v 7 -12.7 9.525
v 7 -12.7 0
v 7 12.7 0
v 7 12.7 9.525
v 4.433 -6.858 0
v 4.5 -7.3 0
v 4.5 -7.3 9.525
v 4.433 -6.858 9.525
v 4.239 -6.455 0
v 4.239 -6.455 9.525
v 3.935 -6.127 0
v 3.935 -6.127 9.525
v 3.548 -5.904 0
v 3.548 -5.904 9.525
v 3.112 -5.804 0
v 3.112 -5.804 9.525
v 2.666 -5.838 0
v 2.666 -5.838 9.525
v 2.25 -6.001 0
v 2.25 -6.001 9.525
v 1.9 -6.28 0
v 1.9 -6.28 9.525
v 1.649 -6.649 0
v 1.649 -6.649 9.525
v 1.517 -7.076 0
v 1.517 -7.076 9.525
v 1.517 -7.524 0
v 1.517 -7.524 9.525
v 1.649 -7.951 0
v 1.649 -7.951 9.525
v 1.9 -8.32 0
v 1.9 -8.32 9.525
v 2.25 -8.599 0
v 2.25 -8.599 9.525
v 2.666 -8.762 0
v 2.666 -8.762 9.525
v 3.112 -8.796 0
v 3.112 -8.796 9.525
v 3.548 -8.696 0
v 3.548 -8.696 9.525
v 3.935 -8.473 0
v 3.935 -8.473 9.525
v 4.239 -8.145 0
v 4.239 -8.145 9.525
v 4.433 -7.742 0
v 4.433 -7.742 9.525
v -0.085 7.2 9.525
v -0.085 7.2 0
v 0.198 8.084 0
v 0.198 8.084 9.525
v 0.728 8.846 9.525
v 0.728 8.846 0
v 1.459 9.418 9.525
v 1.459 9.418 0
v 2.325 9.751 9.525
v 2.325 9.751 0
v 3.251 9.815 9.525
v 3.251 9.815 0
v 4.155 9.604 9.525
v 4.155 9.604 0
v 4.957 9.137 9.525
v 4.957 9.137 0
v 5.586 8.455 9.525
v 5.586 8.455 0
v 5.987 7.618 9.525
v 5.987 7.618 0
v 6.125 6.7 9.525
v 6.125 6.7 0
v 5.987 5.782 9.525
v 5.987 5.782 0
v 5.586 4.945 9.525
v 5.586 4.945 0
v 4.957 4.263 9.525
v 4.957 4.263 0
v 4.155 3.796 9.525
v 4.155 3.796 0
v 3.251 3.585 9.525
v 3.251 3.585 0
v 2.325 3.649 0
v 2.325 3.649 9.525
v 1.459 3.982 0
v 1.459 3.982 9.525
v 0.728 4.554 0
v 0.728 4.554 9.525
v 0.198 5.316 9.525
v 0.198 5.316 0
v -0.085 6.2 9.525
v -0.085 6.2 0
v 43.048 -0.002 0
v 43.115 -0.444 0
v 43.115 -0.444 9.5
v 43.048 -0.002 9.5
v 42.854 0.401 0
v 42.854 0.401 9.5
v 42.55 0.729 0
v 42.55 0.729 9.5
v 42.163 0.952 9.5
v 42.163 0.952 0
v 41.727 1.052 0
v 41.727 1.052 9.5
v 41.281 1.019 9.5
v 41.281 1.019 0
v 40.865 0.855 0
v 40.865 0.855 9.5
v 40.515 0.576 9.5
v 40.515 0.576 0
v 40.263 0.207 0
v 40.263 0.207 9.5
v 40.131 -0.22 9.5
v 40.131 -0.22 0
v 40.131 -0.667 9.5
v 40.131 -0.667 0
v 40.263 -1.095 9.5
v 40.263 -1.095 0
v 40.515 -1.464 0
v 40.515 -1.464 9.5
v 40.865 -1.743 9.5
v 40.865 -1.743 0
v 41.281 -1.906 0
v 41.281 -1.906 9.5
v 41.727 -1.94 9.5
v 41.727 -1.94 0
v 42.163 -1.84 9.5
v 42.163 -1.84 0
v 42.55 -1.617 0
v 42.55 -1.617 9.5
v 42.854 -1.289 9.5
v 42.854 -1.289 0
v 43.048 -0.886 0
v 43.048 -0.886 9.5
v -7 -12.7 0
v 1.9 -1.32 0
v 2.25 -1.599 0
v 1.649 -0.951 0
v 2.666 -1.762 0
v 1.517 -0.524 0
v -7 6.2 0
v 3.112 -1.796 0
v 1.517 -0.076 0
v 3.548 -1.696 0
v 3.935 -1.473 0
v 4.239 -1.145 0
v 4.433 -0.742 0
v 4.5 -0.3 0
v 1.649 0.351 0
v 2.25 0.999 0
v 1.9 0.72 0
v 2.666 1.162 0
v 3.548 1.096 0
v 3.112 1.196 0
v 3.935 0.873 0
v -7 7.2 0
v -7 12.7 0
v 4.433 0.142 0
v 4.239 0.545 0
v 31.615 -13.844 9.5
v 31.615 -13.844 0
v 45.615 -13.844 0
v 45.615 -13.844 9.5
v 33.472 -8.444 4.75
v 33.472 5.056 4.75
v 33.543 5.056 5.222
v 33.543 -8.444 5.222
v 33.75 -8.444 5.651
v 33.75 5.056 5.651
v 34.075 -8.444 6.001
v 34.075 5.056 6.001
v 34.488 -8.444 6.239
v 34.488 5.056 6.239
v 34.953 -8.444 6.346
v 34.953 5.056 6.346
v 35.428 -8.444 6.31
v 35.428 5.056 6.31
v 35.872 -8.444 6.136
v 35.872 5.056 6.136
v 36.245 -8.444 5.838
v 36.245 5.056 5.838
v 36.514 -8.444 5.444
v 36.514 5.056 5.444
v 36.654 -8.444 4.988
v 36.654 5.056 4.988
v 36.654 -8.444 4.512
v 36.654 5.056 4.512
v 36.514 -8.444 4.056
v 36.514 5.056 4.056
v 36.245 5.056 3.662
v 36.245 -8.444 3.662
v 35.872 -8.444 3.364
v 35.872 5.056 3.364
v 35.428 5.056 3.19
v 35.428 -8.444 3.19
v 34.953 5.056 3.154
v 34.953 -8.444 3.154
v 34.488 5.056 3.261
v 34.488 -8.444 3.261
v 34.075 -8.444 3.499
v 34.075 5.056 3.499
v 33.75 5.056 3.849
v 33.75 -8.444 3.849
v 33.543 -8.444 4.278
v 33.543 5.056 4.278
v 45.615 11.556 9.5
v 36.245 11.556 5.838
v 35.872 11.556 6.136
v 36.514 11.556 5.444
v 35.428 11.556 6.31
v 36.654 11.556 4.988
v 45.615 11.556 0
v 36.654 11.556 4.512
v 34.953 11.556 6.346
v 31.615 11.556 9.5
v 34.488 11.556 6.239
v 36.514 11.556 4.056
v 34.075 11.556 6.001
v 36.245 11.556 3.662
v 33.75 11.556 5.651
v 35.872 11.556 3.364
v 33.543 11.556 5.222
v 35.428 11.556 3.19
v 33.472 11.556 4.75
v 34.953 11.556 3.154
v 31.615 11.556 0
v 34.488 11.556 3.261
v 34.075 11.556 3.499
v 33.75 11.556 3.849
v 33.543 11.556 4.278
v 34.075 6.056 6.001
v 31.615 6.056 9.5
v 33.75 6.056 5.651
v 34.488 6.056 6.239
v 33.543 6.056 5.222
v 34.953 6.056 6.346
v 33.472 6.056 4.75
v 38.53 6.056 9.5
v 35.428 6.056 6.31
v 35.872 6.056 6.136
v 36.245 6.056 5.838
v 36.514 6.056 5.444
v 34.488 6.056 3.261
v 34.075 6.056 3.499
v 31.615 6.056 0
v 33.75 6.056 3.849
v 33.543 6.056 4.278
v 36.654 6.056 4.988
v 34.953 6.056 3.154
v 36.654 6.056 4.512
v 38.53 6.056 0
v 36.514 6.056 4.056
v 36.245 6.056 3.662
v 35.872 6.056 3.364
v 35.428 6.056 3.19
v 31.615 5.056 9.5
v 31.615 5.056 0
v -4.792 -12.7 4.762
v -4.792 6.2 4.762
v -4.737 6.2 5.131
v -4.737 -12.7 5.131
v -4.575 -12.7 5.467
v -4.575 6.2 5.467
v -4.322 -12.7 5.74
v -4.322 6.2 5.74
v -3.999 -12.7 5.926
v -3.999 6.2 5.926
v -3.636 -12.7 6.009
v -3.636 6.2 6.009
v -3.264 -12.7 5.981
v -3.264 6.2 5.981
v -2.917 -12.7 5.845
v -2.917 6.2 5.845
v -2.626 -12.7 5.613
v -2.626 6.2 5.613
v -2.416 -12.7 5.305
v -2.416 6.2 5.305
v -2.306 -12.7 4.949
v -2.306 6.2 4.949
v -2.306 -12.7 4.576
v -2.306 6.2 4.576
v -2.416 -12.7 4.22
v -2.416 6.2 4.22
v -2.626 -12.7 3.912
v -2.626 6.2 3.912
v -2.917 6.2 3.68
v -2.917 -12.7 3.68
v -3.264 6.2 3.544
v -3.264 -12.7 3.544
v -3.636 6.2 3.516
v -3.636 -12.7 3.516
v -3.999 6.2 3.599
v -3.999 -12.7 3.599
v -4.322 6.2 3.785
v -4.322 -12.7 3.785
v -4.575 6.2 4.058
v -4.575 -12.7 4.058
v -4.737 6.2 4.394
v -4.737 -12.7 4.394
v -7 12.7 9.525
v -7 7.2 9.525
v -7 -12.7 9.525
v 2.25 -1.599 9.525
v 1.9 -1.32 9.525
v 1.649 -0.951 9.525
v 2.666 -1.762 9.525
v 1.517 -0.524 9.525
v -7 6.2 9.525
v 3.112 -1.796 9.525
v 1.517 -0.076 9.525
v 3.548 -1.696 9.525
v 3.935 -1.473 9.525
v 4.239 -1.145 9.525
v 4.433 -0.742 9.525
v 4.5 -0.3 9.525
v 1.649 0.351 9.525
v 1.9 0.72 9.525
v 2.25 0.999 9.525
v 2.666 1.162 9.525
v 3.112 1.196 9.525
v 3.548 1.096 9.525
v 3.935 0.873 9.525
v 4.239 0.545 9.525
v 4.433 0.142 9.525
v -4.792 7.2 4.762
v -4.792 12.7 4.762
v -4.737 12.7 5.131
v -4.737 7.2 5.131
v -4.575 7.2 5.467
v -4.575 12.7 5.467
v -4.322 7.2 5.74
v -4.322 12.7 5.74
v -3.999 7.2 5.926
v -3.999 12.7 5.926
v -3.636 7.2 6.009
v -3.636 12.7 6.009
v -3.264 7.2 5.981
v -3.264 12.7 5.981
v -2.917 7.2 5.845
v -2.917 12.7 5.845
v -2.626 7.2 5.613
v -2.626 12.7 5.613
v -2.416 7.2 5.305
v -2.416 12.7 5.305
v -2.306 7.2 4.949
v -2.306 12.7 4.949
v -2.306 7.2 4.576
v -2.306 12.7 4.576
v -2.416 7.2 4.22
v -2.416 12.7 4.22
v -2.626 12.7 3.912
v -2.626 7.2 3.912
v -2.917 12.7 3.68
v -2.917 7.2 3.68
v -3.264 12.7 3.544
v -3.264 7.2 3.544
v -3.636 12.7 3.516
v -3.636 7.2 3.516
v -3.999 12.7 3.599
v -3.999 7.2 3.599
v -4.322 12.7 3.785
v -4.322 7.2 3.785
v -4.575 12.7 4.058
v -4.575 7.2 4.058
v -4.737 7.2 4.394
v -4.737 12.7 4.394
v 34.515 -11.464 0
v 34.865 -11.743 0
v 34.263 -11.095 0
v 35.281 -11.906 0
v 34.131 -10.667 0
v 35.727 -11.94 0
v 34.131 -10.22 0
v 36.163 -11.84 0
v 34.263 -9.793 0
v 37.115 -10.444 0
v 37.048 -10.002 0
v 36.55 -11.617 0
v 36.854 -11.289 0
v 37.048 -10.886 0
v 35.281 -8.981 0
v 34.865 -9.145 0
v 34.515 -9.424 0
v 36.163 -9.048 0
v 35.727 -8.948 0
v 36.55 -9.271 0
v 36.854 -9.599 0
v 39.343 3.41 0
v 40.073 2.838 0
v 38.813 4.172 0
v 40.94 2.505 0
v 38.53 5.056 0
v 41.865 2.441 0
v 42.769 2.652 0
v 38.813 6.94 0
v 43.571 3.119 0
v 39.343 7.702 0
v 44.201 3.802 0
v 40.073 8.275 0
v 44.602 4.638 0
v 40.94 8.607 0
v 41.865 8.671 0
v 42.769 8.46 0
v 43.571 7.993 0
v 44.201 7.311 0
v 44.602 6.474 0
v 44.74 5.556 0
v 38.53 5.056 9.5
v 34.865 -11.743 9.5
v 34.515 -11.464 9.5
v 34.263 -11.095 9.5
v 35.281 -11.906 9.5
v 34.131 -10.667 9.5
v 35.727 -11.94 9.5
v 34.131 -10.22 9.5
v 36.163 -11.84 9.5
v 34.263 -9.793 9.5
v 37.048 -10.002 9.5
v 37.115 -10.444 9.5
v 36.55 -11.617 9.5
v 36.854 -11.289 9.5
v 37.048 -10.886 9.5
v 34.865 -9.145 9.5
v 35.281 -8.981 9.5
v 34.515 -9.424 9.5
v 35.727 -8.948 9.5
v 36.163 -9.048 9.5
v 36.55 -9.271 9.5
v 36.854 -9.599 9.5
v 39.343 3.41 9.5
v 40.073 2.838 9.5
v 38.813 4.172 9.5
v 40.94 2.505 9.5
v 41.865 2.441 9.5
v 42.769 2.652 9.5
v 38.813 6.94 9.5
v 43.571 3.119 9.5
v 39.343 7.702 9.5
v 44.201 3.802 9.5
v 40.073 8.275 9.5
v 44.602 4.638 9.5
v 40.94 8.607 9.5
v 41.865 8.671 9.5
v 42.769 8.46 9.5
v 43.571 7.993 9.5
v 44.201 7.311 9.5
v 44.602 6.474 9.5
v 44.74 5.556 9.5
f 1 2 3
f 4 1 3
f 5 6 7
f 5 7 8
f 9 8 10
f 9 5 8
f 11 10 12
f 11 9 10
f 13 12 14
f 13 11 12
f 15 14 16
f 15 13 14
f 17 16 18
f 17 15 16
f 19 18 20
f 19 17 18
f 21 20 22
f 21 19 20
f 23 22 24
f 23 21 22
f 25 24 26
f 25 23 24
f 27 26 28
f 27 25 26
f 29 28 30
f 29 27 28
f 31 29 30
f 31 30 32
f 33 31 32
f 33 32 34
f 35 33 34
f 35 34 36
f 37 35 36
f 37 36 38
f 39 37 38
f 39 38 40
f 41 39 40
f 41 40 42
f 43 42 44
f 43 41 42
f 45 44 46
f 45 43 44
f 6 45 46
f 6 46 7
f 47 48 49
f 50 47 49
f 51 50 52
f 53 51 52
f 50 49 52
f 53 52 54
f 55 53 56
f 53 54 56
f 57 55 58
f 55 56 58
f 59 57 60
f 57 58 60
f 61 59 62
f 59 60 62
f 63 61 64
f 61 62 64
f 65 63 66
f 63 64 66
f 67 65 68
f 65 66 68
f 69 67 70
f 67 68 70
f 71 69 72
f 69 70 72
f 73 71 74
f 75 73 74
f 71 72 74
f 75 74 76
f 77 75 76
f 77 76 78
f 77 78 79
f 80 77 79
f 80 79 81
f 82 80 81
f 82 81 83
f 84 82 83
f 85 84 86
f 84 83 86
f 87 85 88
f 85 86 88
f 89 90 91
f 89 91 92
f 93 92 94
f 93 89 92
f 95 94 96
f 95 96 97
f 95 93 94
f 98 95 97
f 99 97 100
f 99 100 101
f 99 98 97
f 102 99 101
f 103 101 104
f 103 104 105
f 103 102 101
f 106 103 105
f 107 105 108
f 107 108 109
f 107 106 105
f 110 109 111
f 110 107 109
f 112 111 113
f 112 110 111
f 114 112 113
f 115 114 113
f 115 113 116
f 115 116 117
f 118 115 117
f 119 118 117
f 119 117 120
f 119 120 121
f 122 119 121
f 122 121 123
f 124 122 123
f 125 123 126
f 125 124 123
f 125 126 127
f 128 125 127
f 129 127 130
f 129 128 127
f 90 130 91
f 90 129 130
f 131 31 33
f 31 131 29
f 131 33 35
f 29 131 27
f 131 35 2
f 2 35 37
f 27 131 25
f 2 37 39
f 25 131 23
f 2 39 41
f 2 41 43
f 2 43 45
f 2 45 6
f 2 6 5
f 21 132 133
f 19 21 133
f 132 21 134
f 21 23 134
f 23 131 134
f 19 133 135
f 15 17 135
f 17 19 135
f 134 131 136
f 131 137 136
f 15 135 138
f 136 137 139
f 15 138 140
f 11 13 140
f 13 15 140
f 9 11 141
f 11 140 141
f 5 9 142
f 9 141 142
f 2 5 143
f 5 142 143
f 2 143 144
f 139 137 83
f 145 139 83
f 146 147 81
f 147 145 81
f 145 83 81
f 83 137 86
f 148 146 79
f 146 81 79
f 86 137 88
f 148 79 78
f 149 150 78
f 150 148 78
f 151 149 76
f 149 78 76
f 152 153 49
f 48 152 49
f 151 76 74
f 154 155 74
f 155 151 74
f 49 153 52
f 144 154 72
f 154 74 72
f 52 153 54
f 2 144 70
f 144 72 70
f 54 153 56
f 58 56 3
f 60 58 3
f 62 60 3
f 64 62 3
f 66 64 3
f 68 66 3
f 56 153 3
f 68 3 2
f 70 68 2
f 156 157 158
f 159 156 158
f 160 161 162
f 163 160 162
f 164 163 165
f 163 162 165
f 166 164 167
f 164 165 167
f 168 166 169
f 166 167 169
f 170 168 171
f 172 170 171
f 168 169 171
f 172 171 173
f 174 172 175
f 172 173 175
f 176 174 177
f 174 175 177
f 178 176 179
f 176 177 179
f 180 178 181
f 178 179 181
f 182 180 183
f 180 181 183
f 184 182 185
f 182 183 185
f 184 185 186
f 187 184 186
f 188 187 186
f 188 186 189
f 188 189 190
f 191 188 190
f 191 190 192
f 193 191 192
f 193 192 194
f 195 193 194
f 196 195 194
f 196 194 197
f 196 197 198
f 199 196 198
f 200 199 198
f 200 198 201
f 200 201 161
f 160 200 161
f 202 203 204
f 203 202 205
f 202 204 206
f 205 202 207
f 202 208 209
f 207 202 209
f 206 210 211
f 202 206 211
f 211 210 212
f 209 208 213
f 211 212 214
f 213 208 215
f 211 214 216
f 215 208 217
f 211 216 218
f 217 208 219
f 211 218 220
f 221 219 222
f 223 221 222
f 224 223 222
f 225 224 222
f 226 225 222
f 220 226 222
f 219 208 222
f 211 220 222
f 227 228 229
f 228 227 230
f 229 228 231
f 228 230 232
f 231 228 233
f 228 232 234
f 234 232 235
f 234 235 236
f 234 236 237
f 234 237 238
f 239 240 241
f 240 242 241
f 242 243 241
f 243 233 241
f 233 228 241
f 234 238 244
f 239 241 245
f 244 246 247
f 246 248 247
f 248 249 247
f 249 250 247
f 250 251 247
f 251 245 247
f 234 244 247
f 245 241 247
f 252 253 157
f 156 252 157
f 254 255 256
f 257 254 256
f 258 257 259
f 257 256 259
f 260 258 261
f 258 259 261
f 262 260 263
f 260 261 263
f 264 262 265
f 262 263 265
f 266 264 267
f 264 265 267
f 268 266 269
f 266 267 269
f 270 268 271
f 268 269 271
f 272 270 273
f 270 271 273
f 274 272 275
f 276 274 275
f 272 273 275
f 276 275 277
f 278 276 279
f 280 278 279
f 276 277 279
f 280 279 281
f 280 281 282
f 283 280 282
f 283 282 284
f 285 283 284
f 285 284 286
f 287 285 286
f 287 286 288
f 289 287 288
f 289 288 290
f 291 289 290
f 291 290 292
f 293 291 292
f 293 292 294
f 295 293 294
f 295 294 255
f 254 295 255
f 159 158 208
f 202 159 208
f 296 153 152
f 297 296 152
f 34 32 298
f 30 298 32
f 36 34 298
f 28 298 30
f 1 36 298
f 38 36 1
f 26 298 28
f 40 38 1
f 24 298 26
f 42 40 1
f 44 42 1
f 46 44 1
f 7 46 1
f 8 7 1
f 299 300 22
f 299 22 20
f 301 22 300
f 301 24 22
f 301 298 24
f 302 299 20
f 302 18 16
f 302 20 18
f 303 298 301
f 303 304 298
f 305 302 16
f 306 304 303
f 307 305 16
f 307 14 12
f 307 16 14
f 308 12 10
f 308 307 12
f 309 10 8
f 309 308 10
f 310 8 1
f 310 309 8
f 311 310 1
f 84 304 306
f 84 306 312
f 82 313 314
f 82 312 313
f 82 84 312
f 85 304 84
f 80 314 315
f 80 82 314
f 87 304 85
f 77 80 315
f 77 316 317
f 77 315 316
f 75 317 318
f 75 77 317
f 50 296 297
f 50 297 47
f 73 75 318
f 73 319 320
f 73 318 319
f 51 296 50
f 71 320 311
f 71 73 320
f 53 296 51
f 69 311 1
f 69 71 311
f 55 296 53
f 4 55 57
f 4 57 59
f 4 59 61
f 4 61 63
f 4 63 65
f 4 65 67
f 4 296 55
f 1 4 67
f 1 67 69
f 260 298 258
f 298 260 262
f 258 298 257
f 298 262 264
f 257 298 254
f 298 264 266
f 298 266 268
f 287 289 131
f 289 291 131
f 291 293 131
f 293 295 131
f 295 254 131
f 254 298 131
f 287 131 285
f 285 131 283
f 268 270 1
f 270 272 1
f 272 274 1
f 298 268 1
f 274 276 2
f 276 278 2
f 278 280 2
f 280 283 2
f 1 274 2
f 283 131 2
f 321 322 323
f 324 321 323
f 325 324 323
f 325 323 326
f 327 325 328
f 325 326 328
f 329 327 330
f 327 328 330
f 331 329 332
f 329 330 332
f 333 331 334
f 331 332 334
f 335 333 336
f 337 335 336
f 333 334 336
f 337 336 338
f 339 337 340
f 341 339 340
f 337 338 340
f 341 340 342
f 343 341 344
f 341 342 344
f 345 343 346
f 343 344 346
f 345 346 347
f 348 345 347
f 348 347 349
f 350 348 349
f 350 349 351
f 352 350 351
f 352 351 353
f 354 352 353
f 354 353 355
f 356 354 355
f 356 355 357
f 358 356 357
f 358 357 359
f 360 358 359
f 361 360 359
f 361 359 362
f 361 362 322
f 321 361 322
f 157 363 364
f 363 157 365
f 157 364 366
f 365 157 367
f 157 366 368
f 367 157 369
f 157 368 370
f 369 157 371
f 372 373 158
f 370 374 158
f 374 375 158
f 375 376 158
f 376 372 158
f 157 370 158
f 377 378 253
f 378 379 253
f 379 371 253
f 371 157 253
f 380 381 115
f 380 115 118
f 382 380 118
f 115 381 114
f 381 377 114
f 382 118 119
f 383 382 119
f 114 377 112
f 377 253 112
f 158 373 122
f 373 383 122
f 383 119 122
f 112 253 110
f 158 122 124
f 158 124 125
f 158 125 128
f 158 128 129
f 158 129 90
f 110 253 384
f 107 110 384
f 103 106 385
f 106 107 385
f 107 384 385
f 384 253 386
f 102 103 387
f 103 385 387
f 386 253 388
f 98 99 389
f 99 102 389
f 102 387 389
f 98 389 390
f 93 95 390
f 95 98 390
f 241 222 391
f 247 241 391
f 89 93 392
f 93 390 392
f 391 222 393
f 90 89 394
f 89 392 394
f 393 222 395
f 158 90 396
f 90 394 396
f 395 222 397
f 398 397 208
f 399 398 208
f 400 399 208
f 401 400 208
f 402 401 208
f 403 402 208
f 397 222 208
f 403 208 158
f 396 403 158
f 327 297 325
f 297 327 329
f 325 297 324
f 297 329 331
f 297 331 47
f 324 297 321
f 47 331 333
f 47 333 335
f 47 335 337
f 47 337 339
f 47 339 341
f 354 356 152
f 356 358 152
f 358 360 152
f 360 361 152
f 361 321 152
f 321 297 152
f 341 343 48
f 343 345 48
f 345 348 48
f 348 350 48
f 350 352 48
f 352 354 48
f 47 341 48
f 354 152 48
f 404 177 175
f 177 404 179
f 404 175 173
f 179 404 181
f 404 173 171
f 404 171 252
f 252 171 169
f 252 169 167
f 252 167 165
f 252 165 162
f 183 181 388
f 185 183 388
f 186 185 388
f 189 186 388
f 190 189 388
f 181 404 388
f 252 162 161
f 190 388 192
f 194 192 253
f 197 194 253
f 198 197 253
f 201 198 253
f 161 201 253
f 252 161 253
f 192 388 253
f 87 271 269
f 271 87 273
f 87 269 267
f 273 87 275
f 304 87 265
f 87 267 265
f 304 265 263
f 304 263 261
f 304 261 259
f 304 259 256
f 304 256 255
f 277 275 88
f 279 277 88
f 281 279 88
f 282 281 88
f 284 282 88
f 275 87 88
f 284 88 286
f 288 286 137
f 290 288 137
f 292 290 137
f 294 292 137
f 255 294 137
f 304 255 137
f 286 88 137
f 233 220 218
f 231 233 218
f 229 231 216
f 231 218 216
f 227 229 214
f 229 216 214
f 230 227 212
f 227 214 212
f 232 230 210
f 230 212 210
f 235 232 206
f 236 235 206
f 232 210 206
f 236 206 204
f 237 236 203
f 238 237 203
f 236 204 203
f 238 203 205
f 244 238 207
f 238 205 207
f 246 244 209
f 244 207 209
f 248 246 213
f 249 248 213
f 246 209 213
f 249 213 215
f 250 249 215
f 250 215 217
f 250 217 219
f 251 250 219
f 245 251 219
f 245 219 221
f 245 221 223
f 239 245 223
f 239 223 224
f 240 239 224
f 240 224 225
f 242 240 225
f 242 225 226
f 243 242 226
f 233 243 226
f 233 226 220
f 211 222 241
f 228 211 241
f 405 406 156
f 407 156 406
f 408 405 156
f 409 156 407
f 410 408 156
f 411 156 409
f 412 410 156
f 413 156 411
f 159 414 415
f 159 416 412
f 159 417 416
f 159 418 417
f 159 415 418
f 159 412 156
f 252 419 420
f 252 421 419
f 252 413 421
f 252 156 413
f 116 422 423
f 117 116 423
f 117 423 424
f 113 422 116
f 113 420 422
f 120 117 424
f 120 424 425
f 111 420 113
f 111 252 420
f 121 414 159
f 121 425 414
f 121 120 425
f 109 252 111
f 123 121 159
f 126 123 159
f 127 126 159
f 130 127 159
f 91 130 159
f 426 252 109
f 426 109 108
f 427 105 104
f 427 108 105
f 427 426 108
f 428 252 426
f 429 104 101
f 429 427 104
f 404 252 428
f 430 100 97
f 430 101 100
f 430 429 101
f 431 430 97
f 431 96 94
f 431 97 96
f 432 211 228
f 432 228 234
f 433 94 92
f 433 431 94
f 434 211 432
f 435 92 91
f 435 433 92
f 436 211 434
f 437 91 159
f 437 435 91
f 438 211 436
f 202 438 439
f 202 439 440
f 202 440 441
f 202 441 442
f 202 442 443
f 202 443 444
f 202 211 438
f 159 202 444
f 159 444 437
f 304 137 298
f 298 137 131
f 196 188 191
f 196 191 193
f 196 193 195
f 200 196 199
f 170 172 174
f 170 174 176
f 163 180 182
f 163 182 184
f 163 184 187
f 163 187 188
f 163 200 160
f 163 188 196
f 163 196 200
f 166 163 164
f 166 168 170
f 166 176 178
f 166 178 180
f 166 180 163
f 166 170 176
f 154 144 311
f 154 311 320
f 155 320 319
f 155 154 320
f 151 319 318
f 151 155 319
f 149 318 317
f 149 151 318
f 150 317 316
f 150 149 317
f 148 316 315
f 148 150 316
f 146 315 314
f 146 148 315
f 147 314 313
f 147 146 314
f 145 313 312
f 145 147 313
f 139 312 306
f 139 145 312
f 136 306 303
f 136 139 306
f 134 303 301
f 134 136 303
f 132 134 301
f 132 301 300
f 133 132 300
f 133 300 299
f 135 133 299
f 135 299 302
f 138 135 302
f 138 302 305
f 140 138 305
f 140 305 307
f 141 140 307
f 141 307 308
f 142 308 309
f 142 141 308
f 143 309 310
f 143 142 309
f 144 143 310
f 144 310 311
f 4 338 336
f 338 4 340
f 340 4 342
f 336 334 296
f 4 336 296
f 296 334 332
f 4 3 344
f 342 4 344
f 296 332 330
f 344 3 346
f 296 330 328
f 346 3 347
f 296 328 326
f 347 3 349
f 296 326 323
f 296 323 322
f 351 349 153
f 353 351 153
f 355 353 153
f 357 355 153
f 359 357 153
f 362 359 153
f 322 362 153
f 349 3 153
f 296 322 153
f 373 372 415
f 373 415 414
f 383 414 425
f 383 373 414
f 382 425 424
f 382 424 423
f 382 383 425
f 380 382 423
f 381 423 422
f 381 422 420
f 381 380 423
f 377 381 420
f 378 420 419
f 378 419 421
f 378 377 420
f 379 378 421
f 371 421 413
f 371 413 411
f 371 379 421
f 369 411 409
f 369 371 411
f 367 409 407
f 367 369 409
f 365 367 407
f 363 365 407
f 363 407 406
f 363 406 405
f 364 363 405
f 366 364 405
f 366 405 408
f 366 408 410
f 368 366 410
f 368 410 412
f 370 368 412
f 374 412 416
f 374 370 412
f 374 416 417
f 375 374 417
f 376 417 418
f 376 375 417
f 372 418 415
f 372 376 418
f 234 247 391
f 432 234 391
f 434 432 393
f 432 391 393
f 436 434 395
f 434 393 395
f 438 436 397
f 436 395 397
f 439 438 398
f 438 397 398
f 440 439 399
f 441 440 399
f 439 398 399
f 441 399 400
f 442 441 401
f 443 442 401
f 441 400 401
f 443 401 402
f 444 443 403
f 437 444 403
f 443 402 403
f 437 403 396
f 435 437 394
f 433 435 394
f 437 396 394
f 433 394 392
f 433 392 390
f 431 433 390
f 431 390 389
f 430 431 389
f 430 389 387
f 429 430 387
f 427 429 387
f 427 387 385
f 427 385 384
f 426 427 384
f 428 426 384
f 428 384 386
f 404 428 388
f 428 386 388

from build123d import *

# Parameters (mm, degrees)
F0_R     = 1.5
F1_DEPTH = 9.525
F2_R     = 1.25
F3_DEPTH = 25.401
F4_R     = 1.5
F5_DEPTH = 9.5
F6_R     = 1.6
F7_DEPTH = 20


# Not quite as in the source:
# - a length typed as a fraction of an inch, garbled in the dataset ("3 / 203.2 mm" for 3/8 in), is restored


with BuildPart() as f1:
    # F0 (on Top) → F1 (new body)
    with BuildSketch(Plane.XY):
        with BuildLine():
            Line((-7, -12.7), (7, -12.7))
            Line((7, -12.7), (7, 12.7))
            Line((7, 12.7), (-7, 12.7))
            Line((-7, 12.7), (-7, 7.2))
            Line((-7, 7.2), (-0.0847406698, 7.2))
            ThreePointArc((-0.0847406698, 7.2), (6.125, 6.7), (-0.0847406698, 6.2))
            Line((-0.0847406698, 6.2), (-7, 6.2))
            Line((-7, 6.2), (-7, -12.7))
        make_face()
        with Locations((3, -7.3)):
            Circle(F0_R, mode=Mode.SUBTRACT)
        with Locations((3, -0.3)):
            Circle(F0_R, mode=Mode.SUBTRACT)
    extrude(amount=F1_DEPTH)

    # F2 (on face) → F3 (cut, through all)
    with BuildSketch(Plane(origin=(0, 12.7, 0), x_dir=(-1, 0, 0), z_dir=(0, 1, 0))):
        with Locations((3.5423703349, 4.7625)):
            Circle(F2_R)
    extrude(amount=-F3_DEPTH, mode=Mode.SUBTRACT)


with BuildPart() as f5:
    # F4 (on Top) → F5 (new body)
    with BuildSketch(Plane.XY):
        with BuildLine():
            Line((31.6146114171, -13.843855077), (45.6146114171, -13.843855077))
            Line((45.6146114171, -13.843855077), (45.6146114171, 11.556144923))
            Line((45.6146114171, 11.556144923), (31.6146114171, 11.556144923))
            Line((31.6146114171, 11.556144923), (31.6146114171, 6.056144923))
            Line((31.6146114171, 6.056144923), (38.5298707472, 6.056144923))
            ThreePointArc((38.5298707472, 6.056144923), (44.7396114171, 5.556144923), (38.5298707472, 5.056144923))
            Line((38.5298707472, 5.056144923), (31.6146114171, 5.056144923))
            Line((31.6146114171, 5.056144923), (31.6146114171, -13.843855077))
        make_face()
        with Locations((35.6146114171, -10.443855077)):
            Circle(F4_R, mode=Mode.SUBTRACT)
        with Locations((41.6146114171, -0.443855077)):
            Circle(F4_R, mode=Mode.SUBTRACT)
    extrude(amount=F5_DEPTH)

    # F6 (on face) → F7 (cut)
    with BuildSketch(Plane(origin=(0, 11.556144923, 0), x_dir=(-1, 0, 0), z_dir=(0, 1, 0))):
        with Locations((-35.0722410821, 4.75)):
            Circle(F6_R)
    extrude(amount=-F7_DEPTH, mode=Mode.SUBTRACT)


solid = Compound([f1.part, f5.part])
